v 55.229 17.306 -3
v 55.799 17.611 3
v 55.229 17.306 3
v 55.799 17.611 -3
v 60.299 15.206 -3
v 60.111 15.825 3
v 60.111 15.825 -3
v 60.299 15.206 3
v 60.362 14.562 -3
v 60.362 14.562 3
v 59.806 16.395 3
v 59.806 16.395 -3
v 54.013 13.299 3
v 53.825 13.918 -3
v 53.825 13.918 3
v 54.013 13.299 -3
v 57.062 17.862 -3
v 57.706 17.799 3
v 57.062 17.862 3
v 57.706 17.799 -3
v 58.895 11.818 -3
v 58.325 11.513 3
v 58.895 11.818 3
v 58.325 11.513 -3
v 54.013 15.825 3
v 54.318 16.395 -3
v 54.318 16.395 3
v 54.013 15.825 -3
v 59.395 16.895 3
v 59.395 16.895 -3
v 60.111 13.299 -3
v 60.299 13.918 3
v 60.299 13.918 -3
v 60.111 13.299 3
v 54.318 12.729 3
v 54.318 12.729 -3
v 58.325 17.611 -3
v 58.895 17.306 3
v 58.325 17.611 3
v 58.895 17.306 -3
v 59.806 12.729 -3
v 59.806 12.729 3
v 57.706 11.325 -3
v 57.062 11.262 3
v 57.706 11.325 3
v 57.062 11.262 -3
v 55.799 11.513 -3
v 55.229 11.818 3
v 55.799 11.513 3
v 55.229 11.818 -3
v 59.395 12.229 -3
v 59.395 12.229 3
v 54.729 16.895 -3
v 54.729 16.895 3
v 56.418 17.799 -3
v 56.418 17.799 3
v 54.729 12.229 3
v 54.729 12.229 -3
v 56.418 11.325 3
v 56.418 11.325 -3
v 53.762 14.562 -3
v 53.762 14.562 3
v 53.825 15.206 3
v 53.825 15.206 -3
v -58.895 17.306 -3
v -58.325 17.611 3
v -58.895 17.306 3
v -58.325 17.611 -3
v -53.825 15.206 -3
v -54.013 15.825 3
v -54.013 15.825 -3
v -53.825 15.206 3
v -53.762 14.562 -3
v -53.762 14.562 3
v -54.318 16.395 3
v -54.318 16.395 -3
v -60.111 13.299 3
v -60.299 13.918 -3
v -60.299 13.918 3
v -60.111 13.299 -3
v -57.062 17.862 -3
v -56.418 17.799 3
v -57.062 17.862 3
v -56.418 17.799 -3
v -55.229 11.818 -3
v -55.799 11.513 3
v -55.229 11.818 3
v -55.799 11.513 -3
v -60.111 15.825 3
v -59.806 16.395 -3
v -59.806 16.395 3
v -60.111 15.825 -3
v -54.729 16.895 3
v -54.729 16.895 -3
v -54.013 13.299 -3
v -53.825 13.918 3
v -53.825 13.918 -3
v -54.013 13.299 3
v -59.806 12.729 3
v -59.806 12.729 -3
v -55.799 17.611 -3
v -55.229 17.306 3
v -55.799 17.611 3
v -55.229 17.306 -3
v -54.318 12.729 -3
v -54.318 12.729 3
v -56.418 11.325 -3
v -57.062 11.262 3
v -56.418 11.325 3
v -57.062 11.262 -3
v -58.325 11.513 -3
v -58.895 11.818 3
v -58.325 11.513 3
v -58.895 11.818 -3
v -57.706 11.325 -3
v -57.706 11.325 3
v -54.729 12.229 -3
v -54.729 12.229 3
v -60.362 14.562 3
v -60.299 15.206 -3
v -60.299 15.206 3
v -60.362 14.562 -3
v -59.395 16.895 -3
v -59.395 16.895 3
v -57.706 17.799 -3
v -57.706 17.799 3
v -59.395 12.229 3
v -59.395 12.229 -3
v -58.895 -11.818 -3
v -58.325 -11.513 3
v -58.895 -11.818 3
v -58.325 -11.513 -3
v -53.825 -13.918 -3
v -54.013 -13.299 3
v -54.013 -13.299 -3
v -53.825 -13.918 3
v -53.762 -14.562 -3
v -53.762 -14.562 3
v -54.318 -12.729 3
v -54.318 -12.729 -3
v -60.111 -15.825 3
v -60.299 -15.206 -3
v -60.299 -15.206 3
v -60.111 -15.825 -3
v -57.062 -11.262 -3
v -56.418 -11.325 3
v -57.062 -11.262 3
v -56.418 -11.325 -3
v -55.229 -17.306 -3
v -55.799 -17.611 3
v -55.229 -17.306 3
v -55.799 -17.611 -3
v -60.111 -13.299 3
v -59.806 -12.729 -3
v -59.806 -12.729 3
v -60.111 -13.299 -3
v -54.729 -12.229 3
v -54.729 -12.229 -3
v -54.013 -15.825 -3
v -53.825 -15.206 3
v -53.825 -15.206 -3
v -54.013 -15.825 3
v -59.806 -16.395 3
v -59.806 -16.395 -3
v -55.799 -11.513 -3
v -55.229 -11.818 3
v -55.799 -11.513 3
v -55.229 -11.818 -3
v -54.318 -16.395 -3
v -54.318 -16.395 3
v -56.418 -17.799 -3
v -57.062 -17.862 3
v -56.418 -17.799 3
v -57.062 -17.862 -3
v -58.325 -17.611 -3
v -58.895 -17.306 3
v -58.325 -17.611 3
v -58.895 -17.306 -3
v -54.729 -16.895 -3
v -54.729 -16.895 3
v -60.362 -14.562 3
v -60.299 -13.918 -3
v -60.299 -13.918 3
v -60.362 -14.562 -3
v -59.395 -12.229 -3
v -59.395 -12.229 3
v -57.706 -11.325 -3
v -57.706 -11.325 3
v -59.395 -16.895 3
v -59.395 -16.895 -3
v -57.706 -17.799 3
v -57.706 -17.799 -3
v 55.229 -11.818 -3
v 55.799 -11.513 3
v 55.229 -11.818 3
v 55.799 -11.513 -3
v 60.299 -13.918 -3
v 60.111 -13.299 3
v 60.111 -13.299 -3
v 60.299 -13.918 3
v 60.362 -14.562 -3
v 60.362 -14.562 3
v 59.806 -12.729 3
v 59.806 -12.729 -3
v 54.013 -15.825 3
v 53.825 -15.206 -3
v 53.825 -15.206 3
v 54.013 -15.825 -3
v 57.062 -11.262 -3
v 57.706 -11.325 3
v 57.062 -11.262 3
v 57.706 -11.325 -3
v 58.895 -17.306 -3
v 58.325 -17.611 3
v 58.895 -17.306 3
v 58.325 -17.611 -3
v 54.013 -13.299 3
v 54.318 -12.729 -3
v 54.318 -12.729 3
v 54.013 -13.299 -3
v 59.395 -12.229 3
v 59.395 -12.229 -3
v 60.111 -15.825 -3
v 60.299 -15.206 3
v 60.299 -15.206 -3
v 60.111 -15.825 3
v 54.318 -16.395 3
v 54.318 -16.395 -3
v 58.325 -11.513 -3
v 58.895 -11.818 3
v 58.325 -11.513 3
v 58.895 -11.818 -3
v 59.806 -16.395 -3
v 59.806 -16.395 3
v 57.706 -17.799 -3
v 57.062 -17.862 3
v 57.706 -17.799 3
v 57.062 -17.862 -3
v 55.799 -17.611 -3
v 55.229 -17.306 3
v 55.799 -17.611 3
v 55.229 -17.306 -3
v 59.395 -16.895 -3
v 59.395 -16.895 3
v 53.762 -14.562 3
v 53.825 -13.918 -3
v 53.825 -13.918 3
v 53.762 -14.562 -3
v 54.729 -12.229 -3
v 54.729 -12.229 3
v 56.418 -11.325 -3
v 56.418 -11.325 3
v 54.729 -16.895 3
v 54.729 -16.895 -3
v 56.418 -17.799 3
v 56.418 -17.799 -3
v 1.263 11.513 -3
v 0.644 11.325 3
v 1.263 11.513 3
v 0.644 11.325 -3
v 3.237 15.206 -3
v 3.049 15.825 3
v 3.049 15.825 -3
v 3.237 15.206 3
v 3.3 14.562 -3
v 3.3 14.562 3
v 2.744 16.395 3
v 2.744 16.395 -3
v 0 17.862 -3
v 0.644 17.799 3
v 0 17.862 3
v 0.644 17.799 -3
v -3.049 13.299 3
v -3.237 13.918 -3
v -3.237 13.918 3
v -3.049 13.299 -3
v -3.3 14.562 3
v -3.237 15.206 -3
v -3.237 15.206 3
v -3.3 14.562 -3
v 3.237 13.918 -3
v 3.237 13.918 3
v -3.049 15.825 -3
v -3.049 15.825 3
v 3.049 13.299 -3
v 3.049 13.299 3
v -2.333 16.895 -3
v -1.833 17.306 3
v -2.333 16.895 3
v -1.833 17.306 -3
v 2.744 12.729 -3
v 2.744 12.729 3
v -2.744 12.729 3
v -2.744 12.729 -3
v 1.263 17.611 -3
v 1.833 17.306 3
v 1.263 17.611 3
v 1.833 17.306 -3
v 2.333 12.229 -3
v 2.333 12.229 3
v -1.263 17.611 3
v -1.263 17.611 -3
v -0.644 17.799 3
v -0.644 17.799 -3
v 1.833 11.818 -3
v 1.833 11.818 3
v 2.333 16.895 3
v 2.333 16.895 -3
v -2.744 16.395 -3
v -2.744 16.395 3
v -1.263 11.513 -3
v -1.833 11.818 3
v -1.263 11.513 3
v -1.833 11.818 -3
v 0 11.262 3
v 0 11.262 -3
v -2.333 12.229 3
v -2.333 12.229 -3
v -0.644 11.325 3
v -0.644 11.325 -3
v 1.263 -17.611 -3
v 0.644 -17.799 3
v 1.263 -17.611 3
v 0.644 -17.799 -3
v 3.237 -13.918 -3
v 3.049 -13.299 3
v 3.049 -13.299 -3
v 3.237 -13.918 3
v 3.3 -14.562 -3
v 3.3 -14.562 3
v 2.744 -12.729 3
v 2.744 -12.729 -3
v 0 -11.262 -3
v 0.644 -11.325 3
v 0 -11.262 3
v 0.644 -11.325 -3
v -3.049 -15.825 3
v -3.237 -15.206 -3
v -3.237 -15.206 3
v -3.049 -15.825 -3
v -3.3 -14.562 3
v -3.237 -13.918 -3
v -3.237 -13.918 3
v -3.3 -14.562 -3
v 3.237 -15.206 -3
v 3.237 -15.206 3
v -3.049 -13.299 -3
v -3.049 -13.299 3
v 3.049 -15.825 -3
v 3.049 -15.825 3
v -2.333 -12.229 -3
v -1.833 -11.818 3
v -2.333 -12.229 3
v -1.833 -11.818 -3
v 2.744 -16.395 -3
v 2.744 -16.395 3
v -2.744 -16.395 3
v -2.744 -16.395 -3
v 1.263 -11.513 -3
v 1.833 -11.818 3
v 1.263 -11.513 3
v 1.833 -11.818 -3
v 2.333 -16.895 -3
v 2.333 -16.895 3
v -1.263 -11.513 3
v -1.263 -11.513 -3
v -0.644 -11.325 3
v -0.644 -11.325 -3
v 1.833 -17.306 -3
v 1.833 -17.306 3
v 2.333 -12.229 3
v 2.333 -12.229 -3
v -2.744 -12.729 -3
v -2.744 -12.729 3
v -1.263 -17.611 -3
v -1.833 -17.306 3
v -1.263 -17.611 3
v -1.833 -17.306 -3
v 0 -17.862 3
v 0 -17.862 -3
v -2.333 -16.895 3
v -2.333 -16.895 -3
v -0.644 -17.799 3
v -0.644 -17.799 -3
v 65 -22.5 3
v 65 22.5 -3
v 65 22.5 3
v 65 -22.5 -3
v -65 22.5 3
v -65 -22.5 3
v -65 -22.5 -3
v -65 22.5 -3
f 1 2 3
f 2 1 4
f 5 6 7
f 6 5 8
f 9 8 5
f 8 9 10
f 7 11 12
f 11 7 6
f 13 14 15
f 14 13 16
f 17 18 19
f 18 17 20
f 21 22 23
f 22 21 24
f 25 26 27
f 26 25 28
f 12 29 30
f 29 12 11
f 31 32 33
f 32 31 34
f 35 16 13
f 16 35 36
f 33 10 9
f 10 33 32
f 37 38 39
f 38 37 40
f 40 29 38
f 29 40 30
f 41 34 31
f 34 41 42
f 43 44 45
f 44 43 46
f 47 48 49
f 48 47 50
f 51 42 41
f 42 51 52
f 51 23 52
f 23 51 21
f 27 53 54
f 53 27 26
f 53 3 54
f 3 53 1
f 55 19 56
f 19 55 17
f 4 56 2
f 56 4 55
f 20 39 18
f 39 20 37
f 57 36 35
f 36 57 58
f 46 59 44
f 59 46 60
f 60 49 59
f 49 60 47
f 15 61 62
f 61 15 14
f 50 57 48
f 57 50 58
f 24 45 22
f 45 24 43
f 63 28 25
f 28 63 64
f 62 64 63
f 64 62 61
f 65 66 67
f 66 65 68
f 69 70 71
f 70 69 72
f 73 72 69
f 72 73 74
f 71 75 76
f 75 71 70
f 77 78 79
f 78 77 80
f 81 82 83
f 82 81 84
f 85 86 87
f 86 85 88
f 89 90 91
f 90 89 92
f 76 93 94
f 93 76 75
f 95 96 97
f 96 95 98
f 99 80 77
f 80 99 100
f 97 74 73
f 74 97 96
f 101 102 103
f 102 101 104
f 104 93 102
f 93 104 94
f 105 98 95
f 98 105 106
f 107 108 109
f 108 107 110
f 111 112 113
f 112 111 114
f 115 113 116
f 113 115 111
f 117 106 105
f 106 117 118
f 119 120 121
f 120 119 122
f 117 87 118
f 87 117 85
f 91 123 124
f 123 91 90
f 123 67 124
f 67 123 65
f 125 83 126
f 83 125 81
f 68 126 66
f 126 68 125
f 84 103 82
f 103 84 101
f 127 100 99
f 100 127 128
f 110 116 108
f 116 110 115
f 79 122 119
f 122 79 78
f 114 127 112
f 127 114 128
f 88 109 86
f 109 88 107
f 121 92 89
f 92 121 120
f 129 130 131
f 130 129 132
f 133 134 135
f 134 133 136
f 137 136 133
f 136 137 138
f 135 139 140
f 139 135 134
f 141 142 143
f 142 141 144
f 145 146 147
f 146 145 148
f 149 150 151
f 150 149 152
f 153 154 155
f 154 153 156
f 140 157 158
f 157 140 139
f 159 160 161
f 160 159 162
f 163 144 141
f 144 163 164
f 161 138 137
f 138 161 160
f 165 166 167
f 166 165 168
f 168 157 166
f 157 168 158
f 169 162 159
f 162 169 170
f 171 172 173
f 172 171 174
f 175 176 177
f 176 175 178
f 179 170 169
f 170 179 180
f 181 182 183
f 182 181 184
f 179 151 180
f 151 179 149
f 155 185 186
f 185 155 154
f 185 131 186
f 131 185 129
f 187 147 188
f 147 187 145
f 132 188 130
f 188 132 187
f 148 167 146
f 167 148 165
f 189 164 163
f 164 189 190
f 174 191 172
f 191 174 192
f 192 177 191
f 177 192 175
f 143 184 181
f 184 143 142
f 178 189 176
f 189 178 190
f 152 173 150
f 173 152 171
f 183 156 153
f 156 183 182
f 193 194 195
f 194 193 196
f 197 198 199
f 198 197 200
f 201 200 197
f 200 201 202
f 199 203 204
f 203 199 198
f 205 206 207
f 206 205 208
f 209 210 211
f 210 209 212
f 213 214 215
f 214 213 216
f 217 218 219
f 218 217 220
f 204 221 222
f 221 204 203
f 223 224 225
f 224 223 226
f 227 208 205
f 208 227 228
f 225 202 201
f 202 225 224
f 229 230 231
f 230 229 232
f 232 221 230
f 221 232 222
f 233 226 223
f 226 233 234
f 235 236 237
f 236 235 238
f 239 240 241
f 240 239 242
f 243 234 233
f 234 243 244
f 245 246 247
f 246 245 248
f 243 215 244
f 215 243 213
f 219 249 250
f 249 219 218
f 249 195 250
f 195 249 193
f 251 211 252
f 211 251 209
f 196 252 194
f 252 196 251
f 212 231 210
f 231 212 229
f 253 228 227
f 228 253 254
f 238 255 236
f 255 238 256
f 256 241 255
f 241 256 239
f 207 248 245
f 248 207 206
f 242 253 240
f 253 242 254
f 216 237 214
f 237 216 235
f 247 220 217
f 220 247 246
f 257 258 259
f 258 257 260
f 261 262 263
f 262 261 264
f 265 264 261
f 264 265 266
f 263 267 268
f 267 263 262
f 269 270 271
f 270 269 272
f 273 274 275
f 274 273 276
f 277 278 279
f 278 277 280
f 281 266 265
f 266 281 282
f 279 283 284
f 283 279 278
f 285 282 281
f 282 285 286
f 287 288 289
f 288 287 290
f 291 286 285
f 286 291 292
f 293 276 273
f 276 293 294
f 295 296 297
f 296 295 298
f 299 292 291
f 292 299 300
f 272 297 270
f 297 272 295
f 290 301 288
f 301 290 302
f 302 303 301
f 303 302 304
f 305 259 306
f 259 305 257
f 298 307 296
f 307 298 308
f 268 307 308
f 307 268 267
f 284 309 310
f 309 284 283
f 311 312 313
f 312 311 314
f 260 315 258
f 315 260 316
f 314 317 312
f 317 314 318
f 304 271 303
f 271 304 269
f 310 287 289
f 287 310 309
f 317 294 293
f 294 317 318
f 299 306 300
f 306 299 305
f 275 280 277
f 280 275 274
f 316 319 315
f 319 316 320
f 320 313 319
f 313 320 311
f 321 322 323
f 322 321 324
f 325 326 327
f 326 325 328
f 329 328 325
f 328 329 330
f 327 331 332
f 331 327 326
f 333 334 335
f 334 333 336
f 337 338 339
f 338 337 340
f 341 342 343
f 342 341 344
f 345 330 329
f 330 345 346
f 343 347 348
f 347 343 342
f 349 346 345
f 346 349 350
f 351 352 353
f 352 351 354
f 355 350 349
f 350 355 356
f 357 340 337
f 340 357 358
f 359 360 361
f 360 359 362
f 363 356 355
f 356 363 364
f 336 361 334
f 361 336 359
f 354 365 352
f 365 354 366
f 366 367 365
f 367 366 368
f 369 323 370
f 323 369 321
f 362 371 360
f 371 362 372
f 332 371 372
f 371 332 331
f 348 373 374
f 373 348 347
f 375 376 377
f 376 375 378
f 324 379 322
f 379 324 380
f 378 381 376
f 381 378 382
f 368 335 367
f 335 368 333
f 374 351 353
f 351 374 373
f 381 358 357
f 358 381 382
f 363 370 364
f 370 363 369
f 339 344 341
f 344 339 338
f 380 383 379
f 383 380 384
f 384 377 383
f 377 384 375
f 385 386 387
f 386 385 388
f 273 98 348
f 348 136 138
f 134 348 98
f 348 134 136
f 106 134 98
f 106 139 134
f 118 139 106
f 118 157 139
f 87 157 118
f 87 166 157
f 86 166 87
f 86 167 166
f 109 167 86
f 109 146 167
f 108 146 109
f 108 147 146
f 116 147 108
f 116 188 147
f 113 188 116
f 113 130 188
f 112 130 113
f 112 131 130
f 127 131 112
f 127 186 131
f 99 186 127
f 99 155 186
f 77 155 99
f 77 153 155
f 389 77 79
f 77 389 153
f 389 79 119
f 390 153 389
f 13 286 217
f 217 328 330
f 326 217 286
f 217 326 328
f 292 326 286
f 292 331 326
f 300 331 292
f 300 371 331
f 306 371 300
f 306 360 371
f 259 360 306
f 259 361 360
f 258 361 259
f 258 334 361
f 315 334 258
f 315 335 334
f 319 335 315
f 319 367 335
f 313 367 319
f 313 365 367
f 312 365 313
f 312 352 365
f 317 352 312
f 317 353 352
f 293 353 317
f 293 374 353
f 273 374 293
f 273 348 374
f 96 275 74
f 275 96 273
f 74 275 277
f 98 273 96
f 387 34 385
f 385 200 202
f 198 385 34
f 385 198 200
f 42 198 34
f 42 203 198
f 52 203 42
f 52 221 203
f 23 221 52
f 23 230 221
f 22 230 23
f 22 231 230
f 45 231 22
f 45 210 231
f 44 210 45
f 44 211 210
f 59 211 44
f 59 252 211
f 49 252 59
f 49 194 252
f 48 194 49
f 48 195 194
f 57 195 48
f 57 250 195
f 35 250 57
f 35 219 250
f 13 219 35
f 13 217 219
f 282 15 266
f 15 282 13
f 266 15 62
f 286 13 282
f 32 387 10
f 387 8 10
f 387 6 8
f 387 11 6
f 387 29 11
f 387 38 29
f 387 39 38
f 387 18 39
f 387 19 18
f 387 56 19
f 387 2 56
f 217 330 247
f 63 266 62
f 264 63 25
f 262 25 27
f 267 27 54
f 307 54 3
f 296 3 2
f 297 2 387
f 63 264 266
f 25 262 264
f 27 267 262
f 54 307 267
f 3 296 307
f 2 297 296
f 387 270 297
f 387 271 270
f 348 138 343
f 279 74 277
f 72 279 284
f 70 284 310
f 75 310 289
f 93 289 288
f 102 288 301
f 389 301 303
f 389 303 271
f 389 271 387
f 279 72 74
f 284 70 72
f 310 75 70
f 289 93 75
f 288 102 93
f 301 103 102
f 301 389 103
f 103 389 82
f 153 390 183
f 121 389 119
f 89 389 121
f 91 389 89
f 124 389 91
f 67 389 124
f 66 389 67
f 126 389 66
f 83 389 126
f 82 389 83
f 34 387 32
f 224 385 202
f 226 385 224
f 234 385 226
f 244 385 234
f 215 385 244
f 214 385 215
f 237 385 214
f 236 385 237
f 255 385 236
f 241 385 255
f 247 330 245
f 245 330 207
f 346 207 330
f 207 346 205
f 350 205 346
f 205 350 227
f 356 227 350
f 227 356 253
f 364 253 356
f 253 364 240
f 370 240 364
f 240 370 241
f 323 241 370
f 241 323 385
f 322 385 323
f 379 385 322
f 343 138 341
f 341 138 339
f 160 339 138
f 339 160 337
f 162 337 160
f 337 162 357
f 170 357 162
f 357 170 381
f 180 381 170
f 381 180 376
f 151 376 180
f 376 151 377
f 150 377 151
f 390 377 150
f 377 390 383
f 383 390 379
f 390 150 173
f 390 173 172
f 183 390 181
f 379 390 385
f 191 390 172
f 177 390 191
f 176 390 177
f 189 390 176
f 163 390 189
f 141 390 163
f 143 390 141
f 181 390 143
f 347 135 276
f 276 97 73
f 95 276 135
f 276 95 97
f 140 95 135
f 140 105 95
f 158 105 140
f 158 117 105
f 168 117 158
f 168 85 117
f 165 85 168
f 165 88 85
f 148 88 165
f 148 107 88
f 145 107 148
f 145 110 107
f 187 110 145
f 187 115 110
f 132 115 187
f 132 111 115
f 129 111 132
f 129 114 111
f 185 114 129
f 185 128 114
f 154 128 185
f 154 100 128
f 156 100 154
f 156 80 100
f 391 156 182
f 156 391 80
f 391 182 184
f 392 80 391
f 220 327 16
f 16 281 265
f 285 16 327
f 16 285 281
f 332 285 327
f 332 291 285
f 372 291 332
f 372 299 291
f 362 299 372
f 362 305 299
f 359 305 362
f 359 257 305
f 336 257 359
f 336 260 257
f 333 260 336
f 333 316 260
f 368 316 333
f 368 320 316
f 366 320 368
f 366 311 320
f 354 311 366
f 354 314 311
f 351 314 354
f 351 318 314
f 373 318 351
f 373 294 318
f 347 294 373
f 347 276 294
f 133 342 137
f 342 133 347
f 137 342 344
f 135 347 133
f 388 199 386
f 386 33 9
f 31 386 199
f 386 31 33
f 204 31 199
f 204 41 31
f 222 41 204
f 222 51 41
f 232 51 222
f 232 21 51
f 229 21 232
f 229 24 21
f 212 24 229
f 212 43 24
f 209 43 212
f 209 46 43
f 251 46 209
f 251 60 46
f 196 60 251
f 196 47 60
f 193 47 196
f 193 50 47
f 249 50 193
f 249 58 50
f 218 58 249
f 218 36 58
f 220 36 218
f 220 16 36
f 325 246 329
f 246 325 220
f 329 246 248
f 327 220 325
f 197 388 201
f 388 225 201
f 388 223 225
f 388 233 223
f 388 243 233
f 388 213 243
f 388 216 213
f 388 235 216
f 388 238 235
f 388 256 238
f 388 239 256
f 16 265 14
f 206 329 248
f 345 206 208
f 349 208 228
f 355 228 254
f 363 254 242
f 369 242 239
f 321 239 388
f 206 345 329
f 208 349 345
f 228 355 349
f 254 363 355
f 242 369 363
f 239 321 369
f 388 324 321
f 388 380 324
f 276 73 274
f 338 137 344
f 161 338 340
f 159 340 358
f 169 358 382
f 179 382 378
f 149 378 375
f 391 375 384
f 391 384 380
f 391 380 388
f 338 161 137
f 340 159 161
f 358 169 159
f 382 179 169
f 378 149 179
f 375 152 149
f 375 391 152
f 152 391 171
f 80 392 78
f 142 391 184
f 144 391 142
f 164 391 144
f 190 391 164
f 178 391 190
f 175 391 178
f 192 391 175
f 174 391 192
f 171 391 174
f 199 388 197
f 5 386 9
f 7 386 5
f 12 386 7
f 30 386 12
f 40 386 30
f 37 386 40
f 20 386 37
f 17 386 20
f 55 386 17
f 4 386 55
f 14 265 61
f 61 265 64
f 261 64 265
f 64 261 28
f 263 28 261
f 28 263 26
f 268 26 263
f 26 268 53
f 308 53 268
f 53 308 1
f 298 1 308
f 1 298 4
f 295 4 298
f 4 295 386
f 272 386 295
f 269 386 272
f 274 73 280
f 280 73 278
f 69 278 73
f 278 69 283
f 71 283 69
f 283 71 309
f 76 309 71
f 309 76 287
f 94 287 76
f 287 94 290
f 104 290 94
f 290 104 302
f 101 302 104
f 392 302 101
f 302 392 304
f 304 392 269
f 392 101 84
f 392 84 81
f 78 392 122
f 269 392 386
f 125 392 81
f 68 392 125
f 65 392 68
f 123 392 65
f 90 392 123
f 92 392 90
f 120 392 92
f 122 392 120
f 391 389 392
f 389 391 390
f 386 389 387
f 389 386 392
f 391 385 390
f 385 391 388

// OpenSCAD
$fn = 32;

// ----------------------------------------------------------------------
// Corner plate 130 x 45 x 6
// 6 holes, centres taken from the edge offset
// ----------------------------------------------------------------------

// --- parameters (mm) ---
plate = [130, 45, 6];  // overall size (x, y, z)
holes = 6;             // number of holes the drawing asks for
hole_d = 6.6;          // hole diameter
edge = 7.938;          // hole centre offset from the plate edge

// --- derived feature positions (mm) ---
corner_x = plate[0] / 2 - edge;  // = 57.06   corner hole X
corner_y = plate[1] / 2 - edge;  // = 14.56   corner hole Y
feature_centers = [
  [corner_x, corner_y],
  [-corner_x, corner_y],
  [-corner_x, -corner_y],
  [corner_x, -corner_y],
  [0, corner_y],
  [0, -corner_y]
];   // hole centres the loop below drills

// plate outline, every hole drilled through with the same cutters
difference() {
  cube(plate, center = true);
  for (centre = feature_centers)
    translate([centre[0], centre[1], 0])
      cylinder(d = hole_d, h = plate[2] + 2, center = true);
}
